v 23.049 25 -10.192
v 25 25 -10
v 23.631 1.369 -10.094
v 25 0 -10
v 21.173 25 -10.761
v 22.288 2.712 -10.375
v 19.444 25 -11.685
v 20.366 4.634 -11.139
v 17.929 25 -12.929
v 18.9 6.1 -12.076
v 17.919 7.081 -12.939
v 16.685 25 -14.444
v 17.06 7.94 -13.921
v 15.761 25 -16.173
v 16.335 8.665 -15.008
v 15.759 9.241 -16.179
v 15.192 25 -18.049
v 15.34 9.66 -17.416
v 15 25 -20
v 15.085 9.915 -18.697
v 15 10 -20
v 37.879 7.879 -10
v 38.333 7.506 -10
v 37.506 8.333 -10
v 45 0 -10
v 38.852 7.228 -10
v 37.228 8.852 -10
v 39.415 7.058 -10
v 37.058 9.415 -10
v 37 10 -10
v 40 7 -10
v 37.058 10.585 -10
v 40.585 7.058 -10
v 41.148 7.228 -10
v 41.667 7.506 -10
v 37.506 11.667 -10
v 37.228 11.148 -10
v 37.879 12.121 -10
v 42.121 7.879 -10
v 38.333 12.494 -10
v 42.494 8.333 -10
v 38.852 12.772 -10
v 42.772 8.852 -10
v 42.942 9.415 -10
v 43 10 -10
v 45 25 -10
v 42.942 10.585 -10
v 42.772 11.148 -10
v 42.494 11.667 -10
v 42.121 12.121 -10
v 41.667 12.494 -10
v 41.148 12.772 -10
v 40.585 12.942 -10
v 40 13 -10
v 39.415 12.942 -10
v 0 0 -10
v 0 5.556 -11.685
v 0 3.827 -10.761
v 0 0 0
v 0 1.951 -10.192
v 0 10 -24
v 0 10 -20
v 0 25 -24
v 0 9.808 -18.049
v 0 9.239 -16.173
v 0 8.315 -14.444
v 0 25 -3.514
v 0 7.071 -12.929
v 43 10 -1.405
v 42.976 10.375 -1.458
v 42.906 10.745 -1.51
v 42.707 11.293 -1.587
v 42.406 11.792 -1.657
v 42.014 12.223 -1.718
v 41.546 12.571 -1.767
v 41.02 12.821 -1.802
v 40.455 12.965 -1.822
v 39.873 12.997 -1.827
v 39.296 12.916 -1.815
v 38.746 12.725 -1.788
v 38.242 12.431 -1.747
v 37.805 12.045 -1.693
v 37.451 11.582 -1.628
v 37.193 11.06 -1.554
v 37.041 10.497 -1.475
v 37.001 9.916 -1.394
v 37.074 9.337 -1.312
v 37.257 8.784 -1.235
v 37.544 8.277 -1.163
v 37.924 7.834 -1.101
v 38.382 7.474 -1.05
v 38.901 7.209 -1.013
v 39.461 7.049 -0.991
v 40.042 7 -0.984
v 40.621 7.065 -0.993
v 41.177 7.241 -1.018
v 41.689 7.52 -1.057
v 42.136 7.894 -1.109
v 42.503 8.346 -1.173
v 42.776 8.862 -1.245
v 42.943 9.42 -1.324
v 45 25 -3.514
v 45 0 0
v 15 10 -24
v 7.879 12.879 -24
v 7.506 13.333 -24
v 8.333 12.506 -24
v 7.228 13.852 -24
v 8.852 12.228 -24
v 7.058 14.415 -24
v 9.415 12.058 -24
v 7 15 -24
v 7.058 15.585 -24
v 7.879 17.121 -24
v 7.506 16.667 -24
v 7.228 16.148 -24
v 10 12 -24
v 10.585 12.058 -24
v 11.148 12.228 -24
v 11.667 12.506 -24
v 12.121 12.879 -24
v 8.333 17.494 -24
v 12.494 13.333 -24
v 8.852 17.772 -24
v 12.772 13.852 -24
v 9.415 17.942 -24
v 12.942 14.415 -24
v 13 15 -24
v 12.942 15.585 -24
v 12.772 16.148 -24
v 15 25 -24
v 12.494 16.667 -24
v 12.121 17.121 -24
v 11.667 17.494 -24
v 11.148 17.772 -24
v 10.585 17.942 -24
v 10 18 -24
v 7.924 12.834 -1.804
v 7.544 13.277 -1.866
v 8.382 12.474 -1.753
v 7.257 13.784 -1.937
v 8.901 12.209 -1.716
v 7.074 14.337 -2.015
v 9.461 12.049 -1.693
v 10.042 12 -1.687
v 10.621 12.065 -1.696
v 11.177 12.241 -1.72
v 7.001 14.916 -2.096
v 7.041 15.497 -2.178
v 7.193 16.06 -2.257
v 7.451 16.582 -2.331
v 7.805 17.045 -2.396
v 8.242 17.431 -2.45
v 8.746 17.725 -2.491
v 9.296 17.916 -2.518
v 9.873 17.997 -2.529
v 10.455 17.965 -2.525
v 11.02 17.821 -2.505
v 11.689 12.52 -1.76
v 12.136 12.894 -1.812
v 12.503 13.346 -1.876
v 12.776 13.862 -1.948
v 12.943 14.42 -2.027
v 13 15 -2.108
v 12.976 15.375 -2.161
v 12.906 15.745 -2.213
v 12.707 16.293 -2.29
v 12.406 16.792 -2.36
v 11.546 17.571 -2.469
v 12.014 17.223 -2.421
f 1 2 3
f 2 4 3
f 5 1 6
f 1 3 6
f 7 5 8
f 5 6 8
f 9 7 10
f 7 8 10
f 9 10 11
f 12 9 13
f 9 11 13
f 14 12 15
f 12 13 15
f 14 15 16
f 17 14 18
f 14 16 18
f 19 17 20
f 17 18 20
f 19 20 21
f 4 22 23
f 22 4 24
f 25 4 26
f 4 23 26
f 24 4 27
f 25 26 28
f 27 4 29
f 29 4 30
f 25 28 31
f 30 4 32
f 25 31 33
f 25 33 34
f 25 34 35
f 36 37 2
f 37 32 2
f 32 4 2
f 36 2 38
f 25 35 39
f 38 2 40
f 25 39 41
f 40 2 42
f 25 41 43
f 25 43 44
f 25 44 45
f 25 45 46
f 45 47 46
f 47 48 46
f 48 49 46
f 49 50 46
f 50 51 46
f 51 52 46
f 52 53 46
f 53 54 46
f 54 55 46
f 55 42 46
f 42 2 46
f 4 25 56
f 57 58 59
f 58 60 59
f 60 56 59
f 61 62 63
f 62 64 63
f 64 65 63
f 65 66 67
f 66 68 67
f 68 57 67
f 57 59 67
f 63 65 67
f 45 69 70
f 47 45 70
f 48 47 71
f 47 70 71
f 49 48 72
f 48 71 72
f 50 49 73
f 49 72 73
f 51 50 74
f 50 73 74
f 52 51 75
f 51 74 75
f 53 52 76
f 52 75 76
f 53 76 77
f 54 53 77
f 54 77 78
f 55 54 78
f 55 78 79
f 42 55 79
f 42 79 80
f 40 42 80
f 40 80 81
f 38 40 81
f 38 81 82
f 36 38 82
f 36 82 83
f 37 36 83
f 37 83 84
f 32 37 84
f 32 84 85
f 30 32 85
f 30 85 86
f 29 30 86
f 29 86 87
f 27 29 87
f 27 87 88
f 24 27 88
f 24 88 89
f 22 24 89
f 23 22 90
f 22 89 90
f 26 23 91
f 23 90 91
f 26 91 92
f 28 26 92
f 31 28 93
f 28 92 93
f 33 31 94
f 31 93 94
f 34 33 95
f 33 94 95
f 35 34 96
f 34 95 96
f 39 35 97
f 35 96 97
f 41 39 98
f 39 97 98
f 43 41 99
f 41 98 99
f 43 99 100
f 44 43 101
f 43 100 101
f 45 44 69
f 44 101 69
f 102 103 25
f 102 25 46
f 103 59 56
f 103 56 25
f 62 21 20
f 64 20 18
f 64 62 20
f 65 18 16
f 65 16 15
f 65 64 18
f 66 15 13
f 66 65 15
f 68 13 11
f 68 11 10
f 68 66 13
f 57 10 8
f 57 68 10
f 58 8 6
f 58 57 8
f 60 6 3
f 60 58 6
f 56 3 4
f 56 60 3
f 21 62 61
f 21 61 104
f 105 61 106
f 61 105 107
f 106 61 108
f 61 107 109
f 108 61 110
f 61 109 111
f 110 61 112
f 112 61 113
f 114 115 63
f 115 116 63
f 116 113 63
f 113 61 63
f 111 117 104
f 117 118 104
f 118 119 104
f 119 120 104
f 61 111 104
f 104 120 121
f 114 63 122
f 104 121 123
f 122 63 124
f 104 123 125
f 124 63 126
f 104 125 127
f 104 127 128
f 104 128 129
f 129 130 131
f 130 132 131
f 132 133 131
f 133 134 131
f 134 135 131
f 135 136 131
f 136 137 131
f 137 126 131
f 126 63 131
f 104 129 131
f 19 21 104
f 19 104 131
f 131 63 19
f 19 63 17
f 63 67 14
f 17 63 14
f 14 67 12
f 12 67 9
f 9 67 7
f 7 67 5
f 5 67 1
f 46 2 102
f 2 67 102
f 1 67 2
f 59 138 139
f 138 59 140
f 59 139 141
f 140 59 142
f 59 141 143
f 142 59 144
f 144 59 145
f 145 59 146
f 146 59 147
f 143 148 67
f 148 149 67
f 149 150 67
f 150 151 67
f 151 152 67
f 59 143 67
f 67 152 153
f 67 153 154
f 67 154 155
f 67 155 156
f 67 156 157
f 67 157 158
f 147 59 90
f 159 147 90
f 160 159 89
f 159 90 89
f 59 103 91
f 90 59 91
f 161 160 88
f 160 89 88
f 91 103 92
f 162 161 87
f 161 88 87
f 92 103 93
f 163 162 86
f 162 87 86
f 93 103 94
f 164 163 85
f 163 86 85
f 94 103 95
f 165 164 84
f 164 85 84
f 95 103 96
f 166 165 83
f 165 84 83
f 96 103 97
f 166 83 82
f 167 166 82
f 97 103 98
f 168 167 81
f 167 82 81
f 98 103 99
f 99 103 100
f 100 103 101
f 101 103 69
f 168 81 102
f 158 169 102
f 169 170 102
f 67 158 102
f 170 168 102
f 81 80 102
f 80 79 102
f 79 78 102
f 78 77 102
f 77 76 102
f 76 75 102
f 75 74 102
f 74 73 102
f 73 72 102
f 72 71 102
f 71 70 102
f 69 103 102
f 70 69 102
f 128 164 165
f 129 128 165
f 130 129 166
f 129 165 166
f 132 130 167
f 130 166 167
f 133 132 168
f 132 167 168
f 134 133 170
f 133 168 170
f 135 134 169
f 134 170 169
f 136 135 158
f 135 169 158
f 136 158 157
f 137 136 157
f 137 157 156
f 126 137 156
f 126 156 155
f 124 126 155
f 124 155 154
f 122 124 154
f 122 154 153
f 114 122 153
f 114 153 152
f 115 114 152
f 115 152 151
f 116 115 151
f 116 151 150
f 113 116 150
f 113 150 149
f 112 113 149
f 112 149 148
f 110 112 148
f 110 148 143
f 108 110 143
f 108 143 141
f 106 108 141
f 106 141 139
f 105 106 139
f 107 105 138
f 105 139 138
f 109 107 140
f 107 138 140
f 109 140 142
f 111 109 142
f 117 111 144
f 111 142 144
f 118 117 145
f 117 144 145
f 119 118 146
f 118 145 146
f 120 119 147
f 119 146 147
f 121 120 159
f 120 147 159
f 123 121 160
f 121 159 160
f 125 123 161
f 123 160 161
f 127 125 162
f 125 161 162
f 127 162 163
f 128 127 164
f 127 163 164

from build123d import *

# Parameters (mm, degrees)
SKETCH1_W           = 15
SKETCH1_H           = 15
SKETCH1_R           = 3
BOSS_EXTRUDE1_DEPTH = 24
SKETCH1_3_W         = 45
SKETCH1_3_H         = 25
SKETCH1_3_R         = 3
BOSS_EXTRUDE2_DEPTH = 10
CUT_EXTRUDE1_DEPTH  = 57.797887285
FILLET2_R           = 10


with BuildPart() as part:
    # Sketch1 → Boss-Extrude1 (new body)
    with BuildSketch(Plane.XY):
        with Locations((7.5, 17.5)):
            Rectangle(SKETCH1_W, SKETCH1_H)
        with Locations((10, 15)):
            Circle(SKETCH1_R, mode=Mode.SUBTRACT)
    extrude(amount=-BOSS_EXTRUDE1_DEPTH)

    # Sketch1<3> → Boss-Extrude2 (add)
    with BuildSketch(Plane.XY):
        with Locations((22.5, 12.5)):
            Rectangle(SKETCH1_3_W, SKETCH1_3_H)
        with Locations((10, 15)):
            Circle(SKETCH1_3_R, mode=Mode.SUBTRACT)
        with Locations((40, 10)):
            Circle(SKETCH1_3_R, mode=Mode.SUBTRACT)
    extrude(amount=-BOSS_EXTRUDE2_DEPTH)

    # Sketch2 → Cut-Extrude1 (cut, through all)
    with BuildSketch(Plane(origin=(45, 0, 0), x_dir=(0, 0, -1), z_dir=(1, 0, 0))):
        Polygon((0, 0), (3.513520868, 25), (0, 25), align=None)
    extrude(amount=-CUT_EXTRUDE1_DEPTH, mode=Mode.SUBTRACT)

    # Fillet2
    fillet2_edges = [part.edges().sort_by_distance(p)[0] for p in [
        (7.5, 10, -10),
        (15, 17.5, -10),
    ]]
    fillet(fillet2_edges, radius=FILLET2_R - 0.0001)  # a hair under: the kernel refuses the full size


solid = part.part
